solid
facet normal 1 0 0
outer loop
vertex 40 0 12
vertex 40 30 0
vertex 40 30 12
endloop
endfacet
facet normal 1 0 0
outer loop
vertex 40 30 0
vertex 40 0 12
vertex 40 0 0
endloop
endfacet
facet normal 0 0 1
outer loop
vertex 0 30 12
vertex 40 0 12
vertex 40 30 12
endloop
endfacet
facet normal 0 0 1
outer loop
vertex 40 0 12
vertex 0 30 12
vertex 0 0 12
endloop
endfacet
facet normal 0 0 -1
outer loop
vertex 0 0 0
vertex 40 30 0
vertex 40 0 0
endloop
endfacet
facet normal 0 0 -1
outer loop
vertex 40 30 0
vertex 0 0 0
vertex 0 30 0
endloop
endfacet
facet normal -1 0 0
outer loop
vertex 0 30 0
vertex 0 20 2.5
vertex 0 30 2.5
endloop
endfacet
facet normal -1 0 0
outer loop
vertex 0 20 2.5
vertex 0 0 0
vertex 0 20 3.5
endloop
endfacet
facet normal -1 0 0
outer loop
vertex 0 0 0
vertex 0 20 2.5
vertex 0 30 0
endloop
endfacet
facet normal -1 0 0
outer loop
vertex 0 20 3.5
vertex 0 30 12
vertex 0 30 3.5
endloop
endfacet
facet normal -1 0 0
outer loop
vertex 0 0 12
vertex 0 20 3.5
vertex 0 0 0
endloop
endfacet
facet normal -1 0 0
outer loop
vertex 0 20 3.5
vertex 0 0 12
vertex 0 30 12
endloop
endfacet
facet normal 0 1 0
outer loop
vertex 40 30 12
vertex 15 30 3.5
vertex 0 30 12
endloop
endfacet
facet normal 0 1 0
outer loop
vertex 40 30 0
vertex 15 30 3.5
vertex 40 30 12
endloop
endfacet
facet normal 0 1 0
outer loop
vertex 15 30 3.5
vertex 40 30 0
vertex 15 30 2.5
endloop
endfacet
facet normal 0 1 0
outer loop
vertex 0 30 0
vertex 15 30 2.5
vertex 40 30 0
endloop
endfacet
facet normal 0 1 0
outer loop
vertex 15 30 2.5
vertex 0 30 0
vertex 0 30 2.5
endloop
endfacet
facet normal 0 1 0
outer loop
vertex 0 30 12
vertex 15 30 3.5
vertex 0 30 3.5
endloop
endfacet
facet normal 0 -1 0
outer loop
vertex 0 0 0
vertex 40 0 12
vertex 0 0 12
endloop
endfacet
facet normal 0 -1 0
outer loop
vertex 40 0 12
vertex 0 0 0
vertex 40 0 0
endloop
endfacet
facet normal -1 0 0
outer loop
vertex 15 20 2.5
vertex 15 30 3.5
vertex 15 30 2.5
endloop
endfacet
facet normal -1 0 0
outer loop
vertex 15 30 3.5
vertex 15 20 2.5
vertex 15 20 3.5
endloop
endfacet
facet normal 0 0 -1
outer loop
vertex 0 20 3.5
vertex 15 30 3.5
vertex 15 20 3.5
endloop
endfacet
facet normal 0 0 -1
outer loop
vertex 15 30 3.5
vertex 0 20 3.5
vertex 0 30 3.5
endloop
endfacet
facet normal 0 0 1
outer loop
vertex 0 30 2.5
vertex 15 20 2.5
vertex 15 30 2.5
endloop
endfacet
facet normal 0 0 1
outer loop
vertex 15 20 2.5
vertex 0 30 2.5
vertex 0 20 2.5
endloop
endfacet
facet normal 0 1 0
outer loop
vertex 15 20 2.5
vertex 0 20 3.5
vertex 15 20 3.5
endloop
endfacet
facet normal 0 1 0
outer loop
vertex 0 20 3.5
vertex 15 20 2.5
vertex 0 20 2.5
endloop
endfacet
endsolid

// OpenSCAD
difference()
{
    difference()
    {
        union() { translate([ 0, 0, 0 ]) cube(size = [ 40, 30, 12 ]); }
        translate([ 0, 20, 2.5 ]) cube(size = [ 15, 15, 1 ]);
    }
}

translate([ 17, 0, 1.5 ]) cube(size = [ 1, 20, 0.5 ]);
